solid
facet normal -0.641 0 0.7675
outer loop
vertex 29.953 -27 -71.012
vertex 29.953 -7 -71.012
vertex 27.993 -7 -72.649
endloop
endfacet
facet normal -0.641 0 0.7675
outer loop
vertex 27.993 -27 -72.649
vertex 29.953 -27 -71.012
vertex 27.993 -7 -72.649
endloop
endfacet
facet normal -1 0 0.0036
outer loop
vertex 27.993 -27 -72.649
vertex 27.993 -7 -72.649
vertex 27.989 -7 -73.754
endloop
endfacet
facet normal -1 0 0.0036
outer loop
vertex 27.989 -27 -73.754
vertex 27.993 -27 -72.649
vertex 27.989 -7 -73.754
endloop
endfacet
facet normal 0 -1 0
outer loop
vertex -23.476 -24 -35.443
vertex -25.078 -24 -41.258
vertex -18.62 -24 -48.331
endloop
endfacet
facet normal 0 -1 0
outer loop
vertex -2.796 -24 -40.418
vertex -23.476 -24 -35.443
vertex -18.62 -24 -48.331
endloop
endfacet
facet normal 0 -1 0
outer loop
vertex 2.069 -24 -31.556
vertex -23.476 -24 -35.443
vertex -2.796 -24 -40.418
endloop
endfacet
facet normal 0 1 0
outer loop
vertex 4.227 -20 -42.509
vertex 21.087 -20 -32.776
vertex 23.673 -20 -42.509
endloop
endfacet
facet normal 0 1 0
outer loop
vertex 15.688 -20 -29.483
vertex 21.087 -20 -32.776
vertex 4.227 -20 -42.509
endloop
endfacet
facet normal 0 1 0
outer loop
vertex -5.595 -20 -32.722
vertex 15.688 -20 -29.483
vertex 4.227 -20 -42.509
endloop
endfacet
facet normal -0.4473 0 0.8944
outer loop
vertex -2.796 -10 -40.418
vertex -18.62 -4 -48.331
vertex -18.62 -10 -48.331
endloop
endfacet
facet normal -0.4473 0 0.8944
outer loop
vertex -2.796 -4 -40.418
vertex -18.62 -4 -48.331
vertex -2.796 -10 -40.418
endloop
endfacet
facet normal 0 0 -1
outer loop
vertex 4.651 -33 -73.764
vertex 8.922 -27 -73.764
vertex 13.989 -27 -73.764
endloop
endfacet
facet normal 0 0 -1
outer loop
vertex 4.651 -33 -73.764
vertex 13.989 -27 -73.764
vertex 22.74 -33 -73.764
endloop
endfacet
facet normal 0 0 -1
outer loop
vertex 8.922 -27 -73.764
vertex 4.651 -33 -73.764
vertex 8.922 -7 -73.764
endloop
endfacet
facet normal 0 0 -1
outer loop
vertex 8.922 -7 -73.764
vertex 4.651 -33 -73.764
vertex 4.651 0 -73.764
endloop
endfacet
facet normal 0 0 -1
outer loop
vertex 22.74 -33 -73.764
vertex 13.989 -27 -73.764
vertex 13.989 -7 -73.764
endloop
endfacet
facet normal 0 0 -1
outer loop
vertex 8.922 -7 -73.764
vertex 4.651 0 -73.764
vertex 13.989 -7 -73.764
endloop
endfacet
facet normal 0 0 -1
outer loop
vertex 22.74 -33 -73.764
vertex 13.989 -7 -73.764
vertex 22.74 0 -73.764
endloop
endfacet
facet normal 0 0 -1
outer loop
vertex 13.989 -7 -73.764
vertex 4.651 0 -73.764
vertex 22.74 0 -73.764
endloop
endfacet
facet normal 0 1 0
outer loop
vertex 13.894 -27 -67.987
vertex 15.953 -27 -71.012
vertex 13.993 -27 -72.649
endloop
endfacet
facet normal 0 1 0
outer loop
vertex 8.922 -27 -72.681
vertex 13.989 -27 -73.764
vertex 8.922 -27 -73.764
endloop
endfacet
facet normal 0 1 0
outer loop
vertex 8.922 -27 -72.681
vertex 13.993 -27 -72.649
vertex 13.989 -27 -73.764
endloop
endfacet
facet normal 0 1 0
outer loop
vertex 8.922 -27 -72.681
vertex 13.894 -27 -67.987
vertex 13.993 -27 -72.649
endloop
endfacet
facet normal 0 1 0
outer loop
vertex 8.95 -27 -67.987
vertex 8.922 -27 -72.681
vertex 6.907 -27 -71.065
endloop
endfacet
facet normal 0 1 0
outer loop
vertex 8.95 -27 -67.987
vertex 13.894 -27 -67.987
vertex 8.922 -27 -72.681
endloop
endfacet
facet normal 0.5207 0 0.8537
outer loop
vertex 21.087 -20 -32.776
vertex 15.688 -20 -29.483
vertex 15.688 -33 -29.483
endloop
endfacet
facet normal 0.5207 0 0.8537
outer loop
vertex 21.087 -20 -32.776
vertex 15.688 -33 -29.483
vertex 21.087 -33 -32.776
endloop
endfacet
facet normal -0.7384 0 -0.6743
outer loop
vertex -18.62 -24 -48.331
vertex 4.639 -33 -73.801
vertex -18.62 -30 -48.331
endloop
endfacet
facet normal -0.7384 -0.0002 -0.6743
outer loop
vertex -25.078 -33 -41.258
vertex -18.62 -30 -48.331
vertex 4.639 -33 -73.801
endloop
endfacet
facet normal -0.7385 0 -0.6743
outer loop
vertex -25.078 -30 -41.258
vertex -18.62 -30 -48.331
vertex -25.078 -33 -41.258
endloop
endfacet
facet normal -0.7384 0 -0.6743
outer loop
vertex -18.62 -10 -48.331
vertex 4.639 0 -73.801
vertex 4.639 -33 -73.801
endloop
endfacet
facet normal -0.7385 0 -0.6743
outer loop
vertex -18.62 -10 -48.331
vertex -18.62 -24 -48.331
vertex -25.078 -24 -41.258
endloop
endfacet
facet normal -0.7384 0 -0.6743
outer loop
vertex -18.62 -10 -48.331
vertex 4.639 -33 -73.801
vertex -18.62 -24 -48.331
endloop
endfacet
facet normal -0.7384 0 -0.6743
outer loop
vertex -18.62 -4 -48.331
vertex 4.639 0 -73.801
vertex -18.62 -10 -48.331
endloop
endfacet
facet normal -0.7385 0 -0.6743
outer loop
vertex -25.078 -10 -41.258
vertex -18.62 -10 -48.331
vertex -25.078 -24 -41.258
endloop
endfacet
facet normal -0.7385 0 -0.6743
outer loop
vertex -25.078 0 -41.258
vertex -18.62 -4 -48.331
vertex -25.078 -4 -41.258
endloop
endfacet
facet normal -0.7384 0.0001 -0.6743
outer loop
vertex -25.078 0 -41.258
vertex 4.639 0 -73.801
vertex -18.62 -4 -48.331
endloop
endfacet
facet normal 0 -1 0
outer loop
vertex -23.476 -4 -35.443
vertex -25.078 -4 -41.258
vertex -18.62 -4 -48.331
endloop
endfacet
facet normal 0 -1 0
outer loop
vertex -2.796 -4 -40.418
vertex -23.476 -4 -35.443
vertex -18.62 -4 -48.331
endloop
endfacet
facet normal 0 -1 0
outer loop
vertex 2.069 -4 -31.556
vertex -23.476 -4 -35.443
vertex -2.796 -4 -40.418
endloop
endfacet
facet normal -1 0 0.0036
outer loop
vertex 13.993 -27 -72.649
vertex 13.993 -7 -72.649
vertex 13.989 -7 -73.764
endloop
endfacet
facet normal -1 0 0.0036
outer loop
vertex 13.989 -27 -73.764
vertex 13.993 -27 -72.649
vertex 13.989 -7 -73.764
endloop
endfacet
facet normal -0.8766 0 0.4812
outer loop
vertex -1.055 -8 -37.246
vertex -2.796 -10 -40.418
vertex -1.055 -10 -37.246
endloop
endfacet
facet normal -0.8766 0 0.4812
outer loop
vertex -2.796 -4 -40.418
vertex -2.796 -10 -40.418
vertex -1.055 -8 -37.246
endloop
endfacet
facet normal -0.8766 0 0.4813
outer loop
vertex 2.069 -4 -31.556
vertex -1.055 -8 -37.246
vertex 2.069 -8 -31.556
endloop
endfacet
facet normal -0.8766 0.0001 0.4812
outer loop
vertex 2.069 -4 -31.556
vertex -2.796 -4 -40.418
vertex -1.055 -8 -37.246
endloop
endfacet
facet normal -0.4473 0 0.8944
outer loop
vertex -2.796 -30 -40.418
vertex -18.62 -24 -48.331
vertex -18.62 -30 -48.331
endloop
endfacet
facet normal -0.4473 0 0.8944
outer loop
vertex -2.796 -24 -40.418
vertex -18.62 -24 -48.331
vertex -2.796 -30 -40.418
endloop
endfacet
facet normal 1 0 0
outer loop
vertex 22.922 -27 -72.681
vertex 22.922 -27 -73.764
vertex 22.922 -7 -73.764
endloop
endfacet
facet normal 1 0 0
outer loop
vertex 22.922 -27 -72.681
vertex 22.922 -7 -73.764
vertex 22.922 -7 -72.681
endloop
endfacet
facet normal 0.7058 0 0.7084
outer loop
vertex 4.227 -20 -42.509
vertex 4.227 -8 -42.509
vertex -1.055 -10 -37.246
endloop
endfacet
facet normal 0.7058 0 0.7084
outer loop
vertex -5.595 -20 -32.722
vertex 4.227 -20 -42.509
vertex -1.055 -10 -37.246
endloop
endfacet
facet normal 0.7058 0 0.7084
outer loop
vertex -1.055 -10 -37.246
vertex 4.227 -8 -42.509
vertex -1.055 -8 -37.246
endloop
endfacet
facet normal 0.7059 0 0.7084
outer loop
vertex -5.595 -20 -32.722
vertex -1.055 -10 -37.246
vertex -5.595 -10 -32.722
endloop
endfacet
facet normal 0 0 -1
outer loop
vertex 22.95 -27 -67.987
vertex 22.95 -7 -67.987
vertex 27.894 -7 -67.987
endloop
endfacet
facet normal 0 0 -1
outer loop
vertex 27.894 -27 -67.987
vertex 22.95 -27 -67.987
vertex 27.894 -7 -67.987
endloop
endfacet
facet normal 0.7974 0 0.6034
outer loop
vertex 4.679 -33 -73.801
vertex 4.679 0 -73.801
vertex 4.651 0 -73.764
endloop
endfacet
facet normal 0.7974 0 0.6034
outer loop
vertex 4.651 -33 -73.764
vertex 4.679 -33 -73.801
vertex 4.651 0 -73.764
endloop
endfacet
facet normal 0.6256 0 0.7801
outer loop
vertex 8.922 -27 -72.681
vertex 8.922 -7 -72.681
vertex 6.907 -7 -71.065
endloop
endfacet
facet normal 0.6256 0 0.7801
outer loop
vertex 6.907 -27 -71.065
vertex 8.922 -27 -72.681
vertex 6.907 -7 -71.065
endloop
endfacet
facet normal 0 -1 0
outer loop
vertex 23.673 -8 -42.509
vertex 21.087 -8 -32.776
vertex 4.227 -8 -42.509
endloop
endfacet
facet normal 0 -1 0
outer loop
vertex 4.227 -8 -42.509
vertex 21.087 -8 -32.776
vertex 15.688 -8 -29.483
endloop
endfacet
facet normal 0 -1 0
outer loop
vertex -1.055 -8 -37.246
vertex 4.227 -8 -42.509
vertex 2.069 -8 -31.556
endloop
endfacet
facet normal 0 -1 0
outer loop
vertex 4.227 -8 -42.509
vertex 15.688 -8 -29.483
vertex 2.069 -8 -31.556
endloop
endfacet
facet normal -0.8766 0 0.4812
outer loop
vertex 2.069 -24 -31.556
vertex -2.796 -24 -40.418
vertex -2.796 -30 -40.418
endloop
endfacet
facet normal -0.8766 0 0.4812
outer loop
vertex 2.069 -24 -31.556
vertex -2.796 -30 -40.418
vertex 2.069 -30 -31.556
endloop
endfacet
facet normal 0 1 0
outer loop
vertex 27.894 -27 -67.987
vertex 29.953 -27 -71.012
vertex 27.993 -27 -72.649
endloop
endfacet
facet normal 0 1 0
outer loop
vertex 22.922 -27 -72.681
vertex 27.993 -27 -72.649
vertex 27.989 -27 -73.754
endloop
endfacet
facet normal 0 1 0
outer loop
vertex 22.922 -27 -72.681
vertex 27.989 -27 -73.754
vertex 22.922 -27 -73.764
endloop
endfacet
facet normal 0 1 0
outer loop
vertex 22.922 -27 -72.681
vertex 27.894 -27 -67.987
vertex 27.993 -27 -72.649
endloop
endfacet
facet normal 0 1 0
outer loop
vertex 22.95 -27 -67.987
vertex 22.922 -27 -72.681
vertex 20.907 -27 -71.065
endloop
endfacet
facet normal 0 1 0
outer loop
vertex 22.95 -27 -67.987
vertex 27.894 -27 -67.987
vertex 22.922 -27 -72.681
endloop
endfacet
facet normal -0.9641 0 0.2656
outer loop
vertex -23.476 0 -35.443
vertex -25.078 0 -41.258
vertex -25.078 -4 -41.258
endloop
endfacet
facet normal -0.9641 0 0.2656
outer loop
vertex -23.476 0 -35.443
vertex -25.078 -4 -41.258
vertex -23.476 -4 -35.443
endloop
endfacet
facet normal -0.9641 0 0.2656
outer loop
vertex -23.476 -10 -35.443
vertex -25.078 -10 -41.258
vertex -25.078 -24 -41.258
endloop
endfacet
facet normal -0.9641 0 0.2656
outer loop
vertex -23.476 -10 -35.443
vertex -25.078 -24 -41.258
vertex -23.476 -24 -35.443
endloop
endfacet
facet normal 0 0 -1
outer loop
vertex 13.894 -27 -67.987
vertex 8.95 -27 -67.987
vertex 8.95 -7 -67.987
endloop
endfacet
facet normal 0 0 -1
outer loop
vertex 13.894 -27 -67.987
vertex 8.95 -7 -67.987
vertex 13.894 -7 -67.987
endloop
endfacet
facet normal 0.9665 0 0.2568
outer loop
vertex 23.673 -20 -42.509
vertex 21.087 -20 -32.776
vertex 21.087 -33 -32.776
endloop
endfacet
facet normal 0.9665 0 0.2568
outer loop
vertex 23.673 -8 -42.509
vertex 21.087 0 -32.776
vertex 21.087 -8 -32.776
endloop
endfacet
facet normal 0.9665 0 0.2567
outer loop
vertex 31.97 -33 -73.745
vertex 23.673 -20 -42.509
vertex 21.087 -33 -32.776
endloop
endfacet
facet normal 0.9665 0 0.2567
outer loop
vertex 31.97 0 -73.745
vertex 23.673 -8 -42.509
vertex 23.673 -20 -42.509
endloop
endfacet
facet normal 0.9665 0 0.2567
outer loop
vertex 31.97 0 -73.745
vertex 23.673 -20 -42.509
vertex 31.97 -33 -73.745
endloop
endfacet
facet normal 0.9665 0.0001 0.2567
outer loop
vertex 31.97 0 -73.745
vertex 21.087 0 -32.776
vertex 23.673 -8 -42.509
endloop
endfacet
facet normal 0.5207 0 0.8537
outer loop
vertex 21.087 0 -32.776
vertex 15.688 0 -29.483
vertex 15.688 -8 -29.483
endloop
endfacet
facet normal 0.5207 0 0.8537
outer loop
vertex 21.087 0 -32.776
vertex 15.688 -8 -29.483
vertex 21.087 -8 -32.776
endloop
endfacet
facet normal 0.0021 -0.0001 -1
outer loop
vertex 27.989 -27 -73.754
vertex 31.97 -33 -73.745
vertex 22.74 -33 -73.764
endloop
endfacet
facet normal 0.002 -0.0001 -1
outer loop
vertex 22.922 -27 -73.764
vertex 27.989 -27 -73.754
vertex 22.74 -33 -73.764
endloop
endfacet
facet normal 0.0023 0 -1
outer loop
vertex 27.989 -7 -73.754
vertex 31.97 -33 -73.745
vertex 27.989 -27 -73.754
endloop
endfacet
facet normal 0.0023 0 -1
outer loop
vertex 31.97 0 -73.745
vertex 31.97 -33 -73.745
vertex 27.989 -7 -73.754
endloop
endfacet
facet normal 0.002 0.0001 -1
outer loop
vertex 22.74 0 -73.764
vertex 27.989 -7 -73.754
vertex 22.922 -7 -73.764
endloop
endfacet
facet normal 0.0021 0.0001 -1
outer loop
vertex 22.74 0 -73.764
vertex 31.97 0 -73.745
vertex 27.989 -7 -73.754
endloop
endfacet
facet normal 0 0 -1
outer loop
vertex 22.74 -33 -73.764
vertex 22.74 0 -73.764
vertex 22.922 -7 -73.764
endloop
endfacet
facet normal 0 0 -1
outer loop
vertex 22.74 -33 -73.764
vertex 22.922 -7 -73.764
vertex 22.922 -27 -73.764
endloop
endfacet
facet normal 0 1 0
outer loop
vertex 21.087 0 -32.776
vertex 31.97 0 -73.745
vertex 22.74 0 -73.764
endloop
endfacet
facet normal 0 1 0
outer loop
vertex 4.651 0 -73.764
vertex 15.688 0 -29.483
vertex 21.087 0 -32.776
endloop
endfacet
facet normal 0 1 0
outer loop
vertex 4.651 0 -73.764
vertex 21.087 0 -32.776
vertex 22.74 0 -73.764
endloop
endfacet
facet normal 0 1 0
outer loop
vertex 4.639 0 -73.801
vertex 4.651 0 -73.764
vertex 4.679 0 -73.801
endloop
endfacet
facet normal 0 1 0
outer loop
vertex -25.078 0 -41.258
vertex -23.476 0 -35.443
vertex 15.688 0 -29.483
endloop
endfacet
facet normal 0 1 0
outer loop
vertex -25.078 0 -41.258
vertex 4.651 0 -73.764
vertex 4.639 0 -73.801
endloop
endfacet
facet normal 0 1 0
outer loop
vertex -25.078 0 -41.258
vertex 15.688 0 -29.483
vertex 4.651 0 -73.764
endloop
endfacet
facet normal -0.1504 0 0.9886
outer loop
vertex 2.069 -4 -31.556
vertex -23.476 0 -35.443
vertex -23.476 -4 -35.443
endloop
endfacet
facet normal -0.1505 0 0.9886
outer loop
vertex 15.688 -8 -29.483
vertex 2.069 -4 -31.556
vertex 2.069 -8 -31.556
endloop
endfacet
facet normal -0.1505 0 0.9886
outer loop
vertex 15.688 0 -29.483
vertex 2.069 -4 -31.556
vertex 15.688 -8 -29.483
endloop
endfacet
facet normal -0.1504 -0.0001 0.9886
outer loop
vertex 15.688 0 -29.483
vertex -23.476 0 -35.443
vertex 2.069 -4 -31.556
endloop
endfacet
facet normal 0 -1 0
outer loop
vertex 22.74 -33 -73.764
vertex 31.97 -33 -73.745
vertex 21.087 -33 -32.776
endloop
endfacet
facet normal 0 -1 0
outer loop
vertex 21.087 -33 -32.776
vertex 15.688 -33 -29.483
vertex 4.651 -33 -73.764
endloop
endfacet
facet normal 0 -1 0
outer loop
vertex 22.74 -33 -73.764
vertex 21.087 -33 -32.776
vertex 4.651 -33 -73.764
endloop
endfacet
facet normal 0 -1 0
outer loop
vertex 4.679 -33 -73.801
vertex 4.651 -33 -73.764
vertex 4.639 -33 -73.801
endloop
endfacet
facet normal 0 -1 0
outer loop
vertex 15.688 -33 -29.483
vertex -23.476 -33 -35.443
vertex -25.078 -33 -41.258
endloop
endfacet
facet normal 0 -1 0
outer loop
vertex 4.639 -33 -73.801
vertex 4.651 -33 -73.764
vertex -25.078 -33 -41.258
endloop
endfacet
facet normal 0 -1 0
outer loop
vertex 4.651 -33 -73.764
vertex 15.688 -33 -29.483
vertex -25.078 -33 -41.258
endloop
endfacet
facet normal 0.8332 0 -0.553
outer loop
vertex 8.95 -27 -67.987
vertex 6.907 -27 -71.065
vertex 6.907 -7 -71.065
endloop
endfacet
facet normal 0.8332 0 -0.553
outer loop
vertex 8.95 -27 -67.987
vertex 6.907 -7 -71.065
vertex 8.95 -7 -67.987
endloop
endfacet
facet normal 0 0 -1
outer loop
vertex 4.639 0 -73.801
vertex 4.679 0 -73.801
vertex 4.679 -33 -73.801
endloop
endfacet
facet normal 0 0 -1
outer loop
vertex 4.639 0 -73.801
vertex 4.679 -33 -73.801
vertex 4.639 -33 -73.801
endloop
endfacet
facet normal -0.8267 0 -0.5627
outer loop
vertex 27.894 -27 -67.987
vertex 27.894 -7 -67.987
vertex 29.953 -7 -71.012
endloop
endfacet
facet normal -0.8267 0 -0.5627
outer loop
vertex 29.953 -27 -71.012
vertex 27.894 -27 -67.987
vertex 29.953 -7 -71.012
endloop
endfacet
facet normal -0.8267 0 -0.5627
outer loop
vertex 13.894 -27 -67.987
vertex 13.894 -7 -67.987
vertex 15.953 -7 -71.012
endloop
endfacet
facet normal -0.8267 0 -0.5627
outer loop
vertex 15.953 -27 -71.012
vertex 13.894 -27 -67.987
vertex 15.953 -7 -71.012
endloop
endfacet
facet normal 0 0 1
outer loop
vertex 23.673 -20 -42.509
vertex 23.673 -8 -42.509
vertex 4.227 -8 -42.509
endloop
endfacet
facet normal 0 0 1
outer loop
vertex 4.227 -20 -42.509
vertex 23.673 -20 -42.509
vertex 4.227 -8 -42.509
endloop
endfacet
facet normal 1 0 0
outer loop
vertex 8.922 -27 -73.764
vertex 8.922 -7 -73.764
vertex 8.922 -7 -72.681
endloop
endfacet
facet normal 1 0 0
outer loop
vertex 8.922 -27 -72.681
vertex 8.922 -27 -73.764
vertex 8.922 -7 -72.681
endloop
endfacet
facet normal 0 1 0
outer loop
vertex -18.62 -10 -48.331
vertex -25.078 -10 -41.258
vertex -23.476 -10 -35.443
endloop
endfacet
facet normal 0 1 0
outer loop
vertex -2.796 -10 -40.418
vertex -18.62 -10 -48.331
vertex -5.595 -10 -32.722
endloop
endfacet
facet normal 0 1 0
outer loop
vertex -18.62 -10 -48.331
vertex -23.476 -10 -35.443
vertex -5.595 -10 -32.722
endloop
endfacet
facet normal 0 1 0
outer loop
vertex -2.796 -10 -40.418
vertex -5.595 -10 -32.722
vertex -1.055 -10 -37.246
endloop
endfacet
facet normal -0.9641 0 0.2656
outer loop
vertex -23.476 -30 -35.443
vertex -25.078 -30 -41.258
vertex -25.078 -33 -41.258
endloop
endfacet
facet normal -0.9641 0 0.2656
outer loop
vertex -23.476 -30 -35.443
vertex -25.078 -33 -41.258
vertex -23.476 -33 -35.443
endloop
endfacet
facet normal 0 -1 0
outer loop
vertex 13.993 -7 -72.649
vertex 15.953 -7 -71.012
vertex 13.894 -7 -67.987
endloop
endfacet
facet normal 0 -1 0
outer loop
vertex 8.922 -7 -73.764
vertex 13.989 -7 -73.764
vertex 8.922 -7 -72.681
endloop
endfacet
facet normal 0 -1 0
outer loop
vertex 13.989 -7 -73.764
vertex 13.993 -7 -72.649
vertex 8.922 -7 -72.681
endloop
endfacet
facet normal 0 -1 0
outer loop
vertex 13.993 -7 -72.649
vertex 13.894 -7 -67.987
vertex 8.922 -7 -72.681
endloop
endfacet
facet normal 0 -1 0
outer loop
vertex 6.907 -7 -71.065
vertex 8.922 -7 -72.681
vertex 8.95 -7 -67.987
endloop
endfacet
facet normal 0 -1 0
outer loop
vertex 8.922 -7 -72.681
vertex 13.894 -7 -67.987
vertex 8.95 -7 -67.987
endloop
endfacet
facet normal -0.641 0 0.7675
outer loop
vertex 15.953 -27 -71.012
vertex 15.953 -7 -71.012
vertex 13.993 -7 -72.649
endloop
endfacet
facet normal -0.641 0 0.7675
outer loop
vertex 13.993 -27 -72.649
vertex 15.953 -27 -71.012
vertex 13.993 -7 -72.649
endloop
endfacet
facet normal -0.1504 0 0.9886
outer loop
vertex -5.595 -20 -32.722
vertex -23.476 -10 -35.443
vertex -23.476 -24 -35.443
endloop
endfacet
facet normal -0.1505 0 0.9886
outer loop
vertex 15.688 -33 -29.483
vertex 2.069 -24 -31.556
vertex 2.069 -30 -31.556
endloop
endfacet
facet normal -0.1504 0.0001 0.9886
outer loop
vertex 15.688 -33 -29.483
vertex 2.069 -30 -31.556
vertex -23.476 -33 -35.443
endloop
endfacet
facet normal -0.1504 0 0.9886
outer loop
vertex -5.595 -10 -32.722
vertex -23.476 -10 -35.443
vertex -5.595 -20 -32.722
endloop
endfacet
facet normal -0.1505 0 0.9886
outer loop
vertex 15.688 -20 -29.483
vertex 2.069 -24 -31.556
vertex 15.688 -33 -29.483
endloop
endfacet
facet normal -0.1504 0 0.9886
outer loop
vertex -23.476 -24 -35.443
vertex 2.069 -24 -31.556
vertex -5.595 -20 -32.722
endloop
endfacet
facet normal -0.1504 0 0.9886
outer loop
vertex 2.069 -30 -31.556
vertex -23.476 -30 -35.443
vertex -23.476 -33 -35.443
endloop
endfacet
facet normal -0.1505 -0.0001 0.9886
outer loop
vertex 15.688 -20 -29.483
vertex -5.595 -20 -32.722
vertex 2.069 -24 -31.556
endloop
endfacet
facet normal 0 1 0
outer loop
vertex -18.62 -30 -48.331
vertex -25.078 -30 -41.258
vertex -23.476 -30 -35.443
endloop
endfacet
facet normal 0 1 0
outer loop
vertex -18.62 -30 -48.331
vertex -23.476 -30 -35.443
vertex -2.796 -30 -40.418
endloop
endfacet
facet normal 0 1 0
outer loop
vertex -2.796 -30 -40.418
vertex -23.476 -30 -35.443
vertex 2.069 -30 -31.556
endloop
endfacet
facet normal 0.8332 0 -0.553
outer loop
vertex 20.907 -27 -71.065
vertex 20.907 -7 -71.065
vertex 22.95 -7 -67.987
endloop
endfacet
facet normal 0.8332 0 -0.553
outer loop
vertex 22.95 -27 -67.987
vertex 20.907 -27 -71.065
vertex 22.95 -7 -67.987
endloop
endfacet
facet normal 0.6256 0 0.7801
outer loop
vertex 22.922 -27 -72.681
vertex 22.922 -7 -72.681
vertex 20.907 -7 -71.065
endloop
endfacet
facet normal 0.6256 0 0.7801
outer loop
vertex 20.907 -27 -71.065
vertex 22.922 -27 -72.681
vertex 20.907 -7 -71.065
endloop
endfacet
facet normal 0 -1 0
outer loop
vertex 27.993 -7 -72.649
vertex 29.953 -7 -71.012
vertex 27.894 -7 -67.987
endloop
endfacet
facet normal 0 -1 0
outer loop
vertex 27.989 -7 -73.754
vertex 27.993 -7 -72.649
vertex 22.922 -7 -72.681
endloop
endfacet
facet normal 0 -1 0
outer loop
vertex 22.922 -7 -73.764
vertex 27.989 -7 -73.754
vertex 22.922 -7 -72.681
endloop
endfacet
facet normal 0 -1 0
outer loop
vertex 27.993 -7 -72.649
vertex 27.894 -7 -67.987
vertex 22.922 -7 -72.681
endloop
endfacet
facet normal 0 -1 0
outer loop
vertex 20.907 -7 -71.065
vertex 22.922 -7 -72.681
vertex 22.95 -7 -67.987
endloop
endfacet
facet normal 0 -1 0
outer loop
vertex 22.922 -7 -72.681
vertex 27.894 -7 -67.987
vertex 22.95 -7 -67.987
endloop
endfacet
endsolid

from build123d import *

# Parameters (mm, degrees)
PAD036_DEPTH = 6
PAD037_DEPTH = 6
PAD038_DEPTH = 12
PAD014_DEPTH = 20
PAD012_DEPTH = 33
PAD013_DEPTH = 20
PAD001_DEPTH = 33


with BuildPart() as pad036:
    # Sketch040 → Pad036 (new body)
    with BuildSketch(Plane.XZ.offset(4)):
        Polygon((-22.876627, -50.458862), (-2.795745, -40.418423), (3.522805, -28.90654), (-39.408733, -32.801537), align=None)
    extrude(amount=PAD036_DEPTH)


with BuildPart() as pad037:
    # Sketch041 → Pad037 (new body)
    with BuildSketch(Plane.XZ.offset(24)):
        Polygon((-22.876627, -50.458862), (-2.795745, -40.418423), (3.522805, -28.90654), (-39.408733, -32.801537), align=None)
    extrude(amount=PAD037_DEPTH)


with BuildPart() as pad038:
    # Sketch042 → Pad038 (new body)
    with BuildSketch(Plane.XZ.offset(8)):
        Polygon((26.854265, -42.508881), (4.226509, -42.508881), (-12.077076, -26.263317), (32.65625, -19.126871), align=None)
    extrude(amount=PAD038_DEPTH)


with BuildPart() as pad014:
    # Sketch018 → Pad014 (new body)
    with BuildSketch(Plane(origin=(10, -7, 0), x_dir=(1, 0, 0), z_dir=(0, -1, 0))):
        Polygon((12.921668, -76.043343), (12.921668, -72.681298), (10.907037, -71.064545), (12.949577, -67.987406), (17.894252, -67.987406), (19.953335, -71.012405), (17.993304, -72.648705), (17.981073, -76.043343), align=None)
    extrude(amount=PAD014_DEPTH)


with BuildPart() as pad012:
    # Sketch016 → Pad012 (new body)
    with BuildSketch(Plane.XZ):
        Polygon((31.922119, -73.764191), (34.715668, -84.347412), (31.00419, -84.347412), (29.994871, -83.010223), (29.004835, -82.997353), (29.97435, -84.356453), (27.001257, -84.356453), (25.99424, -83.013763), (24.977634, -83.013763), (26.003832, -84.375633), (23.007538, -84.375633), (22.019703, -83.023636), (20.974325, -83.023636), (22.000523, -84.366325), (19.017838, -84.366325), (17.99164, -83.004456), (16.984625, -83.004456), (18.00123, -84.366325), (15.032244, -84.366325), (14.013124, -83.020378), (12.982291, -83.020378), (14.00141, -84.379204), (12.681671, -84.379204), (4.650895, -73.764191), align=None)
    extrude(amount=PAD012_DEPTH)


with BuildPart() as fusion:
    # Sketch017 → Pad013 (new body)
    with BuildSketch(Plane(origin=(-4, -7, 0), x_dir=(1, 0, 0), z_dir=(0, -1, 0))):
        Polygon((12.921668, -76.043343), (12.921668, -72.681298), (10.907037, -71.064545), (12.949577, -67.987406), (17.894252, -67.987406), (19.953335, -71.012405), (17.993304, -72.648705), (17.981073, -76.043343), align=None)
    extrude(amount=PAD013_DEPTH)

    # Fusion001: union Pad012
    add(pad012.part)

    # Fusion: union Pad014
    add(pad014.part)


with BuildPart() as cut009:
    # Sketch001 → Pad001 (new body)
    with BuildSketch(Plane(origin=(-15, 0, -10), x_dir=(0.819152, 0, 0.573576), z_dir=(0, -1, 0))):
        Polygon((-26.184557, -19.824878), (-21.536683, -15.979609), (13.963177, -33.561758), (16.497322, -39.355457), (1.912507, -79.157962), (-20.506964, -63.527428), align=None)
    extrude(amount=PAD001_DEPTH)

    # Cut: cut Fusion
    add(fusion.part, mode=Mode.SUBTRACT)

    # Cut007: cut Pad038
    add(pad038.part, mode=Mode.SUBTRACT)

    # Cut008: cut Pad037
    add(pad037.part, mode=Mode.SUBTRACT)

    # Cut009: cut Pad036
    add(pad036.part, mode=Mode.SUBTRACT)


solid = cut009.part
